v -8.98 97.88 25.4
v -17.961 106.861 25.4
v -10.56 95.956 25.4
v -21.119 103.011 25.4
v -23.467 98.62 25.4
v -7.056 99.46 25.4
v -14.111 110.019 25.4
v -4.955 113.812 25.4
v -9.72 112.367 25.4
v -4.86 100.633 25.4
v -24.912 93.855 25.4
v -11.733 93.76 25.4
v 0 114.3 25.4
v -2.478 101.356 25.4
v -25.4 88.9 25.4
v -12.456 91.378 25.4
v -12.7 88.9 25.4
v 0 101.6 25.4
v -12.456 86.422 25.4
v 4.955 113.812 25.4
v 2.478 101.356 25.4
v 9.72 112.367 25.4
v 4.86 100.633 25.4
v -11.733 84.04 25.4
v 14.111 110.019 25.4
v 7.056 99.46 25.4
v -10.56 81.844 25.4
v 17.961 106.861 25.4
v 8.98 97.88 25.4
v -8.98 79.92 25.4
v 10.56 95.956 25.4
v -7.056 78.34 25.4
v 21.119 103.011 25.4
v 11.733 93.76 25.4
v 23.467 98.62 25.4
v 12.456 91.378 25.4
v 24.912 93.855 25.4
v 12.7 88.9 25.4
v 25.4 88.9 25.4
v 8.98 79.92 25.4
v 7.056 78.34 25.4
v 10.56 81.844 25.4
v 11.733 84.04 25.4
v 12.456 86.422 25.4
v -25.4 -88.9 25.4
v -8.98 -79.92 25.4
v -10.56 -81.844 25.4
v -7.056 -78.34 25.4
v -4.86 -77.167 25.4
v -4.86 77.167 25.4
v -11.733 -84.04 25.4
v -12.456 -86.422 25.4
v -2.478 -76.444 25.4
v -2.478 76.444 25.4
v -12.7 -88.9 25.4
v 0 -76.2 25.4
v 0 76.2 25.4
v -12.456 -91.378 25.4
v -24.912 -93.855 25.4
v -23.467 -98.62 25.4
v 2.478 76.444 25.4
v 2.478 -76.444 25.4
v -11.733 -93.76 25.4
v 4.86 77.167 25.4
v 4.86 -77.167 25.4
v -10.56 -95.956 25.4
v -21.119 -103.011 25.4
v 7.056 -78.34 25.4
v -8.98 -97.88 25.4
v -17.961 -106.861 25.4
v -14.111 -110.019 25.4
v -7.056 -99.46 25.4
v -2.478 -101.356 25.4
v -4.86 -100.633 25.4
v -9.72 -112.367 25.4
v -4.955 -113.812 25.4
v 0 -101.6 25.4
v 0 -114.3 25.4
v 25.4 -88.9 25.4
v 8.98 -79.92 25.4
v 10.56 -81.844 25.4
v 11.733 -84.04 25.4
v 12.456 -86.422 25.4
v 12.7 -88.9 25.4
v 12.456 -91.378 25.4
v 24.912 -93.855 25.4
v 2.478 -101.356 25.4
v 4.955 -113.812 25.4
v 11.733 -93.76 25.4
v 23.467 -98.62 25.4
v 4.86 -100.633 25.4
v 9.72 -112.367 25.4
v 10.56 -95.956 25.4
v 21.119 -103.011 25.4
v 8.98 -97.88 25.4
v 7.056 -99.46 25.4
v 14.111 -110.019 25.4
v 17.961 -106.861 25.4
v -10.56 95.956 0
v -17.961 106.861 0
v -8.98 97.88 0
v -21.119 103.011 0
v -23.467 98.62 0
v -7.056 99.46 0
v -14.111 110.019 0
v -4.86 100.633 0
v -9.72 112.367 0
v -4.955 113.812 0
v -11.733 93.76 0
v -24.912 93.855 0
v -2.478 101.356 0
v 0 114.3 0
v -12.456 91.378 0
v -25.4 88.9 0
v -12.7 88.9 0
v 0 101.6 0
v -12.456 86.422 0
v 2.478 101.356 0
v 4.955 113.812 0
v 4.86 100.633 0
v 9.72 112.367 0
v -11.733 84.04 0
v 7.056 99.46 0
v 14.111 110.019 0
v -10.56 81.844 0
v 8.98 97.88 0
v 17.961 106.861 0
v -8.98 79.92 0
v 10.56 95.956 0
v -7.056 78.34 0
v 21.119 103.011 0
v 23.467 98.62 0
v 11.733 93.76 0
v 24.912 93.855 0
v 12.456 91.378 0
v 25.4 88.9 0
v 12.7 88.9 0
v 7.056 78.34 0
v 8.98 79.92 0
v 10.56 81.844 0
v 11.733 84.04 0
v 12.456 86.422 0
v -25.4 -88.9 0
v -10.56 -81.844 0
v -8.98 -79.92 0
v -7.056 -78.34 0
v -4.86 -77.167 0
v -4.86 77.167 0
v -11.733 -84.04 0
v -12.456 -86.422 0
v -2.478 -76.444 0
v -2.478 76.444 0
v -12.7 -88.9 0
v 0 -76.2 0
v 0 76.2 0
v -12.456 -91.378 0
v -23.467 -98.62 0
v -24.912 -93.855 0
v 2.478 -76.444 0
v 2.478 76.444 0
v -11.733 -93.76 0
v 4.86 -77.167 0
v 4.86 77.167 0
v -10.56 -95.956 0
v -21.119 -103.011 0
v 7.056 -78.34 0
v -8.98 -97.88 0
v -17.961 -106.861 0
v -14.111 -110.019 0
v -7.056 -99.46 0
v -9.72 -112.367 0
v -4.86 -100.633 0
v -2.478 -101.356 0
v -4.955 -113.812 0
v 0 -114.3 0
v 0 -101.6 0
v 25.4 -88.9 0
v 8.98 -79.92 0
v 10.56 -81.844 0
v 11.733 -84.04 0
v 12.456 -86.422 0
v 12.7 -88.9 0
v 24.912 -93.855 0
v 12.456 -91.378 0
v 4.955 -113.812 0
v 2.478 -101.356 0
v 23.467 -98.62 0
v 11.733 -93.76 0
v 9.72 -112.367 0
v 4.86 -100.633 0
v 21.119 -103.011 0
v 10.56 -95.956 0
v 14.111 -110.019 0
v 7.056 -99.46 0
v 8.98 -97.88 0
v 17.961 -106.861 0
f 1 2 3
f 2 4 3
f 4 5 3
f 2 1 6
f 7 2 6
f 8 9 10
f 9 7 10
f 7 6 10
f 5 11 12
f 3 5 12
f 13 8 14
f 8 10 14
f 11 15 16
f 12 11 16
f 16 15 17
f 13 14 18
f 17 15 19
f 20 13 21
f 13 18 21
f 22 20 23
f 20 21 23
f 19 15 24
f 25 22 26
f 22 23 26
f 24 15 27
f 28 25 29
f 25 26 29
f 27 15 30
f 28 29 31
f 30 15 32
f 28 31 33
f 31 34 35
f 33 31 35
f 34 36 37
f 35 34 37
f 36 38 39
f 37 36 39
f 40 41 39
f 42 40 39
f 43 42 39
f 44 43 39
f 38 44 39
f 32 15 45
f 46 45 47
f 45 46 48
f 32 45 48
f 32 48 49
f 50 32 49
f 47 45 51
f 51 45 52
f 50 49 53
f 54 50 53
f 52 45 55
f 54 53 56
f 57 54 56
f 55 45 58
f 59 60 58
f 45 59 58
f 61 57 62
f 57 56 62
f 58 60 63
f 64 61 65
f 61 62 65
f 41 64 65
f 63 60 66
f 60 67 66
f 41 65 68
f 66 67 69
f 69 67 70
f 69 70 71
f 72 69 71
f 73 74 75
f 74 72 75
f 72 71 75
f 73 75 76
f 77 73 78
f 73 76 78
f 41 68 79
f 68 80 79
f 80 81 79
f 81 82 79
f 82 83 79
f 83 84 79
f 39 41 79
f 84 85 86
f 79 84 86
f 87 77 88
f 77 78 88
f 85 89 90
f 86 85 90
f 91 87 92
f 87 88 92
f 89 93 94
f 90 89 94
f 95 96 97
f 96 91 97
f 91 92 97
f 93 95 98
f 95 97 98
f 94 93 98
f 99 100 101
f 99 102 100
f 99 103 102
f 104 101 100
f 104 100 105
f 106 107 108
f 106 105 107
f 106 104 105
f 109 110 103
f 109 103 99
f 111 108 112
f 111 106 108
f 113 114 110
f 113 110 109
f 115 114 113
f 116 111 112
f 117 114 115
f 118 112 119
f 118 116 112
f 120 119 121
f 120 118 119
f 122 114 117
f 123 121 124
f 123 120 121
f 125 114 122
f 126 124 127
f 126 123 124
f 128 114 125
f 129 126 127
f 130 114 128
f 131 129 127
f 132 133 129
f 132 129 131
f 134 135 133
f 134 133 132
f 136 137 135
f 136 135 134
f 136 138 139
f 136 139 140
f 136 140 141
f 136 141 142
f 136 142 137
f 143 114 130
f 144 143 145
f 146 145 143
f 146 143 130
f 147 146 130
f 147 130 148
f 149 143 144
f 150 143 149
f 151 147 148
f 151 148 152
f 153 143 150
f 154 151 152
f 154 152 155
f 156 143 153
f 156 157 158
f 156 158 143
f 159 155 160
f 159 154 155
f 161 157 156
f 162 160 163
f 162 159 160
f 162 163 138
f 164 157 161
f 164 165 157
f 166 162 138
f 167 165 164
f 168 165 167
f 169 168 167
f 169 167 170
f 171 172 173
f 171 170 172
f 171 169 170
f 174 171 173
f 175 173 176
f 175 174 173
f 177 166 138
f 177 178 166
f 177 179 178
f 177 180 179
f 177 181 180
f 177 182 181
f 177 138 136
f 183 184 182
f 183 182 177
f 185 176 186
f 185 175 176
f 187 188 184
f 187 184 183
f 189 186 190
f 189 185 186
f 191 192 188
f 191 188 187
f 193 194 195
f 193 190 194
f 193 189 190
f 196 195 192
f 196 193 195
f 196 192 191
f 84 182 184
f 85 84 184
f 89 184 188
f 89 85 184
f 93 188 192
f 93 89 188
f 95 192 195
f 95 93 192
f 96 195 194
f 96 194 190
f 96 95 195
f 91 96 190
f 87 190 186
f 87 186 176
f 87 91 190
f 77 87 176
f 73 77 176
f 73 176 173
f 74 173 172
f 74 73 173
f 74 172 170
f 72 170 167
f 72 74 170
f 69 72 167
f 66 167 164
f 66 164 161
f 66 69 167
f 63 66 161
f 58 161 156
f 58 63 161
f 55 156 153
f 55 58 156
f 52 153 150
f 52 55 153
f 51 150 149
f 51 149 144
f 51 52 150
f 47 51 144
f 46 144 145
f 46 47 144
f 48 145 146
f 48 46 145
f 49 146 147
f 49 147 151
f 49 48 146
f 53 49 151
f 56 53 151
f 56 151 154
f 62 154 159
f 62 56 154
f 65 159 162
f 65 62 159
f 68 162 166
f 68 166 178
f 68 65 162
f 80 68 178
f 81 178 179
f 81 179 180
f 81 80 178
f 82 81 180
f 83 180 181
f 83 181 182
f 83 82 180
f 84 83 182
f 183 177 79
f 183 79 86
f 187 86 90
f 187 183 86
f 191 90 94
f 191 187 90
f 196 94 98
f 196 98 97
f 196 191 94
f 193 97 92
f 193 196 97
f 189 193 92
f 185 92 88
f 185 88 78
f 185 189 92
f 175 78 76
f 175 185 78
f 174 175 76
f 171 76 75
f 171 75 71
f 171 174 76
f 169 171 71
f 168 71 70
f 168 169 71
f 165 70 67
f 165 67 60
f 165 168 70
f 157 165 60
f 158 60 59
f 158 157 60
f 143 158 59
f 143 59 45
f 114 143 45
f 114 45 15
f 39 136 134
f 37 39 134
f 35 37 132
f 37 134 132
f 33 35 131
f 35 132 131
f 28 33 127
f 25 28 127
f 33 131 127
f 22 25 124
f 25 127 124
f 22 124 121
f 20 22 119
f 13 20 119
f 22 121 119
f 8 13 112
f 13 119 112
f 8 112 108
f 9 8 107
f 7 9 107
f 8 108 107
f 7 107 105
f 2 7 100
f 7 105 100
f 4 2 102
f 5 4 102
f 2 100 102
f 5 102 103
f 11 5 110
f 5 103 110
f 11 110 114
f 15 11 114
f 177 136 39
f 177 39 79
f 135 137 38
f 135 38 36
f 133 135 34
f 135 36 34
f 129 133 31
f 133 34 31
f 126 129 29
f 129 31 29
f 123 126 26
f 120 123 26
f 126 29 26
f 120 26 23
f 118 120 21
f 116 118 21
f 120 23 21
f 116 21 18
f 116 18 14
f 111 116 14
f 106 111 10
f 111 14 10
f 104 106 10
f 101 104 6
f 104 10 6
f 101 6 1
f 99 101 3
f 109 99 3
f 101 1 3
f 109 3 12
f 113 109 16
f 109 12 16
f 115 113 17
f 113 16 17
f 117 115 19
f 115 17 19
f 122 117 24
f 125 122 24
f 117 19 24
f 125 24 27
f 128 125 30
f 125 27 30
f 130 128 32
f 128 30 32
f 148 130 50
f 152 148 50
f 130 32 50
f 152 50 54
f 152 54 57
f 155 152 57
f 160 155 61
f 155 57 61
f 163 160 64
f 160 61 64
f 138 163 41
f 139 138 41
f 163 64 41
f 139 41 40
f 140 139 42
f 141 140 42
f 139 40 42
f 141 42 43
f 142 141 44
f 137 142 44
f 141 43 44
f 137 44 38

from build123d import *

# Parameters (mm, degrees)
F1_DEPTH = 25.4
F2_R     = 12.7
F3_DEPTH = 25.4


with BuildPart() as f1:
    # F0 (on Top) → F1 (new body)
    with BuildSketch(Plane.XY):
        with BuildLine():
            Line((-25.4, 88.9), (-25.4, 0))
            Line((-25.4, 0), (25.4, 0))
            Line((25.4, 0), (25.4, 88.9))
            ThreePointArc((25.4, 88.9), (0, 63.5), (-25.4, 88.9))
        make_face()
        with BuildLine():
            ThreePointArc((25.4, 88.9), (0, 114.3), (-25.4, 88.9))
            Line((-25.4, 88.9), (25.4, 88.9))
        make_face()
        with BuildLine():
            Line((25.4, 88.9), (-25.4, 88.9))
            ThreePointArc((-25.4, 88.9), (0, 63.5), (25.4, 88.9))
        make_face()
    extrude(amount=F1_DEPTH)

    # F2 (on face) → F3 (cut)
    with BuildSketch(Plane.XY.offset(25.4)):
        with Locations((0, 88.9)):
            Circle(F2_R)
    extrude(amount=-F3_DEPTH, mode=Mode.SUBTRACT)

    # F4: F1 across face


with BuildPart() as f1_1:
    add(f1.part)
    add(f1.part.mirror(Plane(origin=(0, 0, 12.7), x_dir=(1, 0, 0), z_dir=(0, -1, 0))))


solid = f1_1.part
